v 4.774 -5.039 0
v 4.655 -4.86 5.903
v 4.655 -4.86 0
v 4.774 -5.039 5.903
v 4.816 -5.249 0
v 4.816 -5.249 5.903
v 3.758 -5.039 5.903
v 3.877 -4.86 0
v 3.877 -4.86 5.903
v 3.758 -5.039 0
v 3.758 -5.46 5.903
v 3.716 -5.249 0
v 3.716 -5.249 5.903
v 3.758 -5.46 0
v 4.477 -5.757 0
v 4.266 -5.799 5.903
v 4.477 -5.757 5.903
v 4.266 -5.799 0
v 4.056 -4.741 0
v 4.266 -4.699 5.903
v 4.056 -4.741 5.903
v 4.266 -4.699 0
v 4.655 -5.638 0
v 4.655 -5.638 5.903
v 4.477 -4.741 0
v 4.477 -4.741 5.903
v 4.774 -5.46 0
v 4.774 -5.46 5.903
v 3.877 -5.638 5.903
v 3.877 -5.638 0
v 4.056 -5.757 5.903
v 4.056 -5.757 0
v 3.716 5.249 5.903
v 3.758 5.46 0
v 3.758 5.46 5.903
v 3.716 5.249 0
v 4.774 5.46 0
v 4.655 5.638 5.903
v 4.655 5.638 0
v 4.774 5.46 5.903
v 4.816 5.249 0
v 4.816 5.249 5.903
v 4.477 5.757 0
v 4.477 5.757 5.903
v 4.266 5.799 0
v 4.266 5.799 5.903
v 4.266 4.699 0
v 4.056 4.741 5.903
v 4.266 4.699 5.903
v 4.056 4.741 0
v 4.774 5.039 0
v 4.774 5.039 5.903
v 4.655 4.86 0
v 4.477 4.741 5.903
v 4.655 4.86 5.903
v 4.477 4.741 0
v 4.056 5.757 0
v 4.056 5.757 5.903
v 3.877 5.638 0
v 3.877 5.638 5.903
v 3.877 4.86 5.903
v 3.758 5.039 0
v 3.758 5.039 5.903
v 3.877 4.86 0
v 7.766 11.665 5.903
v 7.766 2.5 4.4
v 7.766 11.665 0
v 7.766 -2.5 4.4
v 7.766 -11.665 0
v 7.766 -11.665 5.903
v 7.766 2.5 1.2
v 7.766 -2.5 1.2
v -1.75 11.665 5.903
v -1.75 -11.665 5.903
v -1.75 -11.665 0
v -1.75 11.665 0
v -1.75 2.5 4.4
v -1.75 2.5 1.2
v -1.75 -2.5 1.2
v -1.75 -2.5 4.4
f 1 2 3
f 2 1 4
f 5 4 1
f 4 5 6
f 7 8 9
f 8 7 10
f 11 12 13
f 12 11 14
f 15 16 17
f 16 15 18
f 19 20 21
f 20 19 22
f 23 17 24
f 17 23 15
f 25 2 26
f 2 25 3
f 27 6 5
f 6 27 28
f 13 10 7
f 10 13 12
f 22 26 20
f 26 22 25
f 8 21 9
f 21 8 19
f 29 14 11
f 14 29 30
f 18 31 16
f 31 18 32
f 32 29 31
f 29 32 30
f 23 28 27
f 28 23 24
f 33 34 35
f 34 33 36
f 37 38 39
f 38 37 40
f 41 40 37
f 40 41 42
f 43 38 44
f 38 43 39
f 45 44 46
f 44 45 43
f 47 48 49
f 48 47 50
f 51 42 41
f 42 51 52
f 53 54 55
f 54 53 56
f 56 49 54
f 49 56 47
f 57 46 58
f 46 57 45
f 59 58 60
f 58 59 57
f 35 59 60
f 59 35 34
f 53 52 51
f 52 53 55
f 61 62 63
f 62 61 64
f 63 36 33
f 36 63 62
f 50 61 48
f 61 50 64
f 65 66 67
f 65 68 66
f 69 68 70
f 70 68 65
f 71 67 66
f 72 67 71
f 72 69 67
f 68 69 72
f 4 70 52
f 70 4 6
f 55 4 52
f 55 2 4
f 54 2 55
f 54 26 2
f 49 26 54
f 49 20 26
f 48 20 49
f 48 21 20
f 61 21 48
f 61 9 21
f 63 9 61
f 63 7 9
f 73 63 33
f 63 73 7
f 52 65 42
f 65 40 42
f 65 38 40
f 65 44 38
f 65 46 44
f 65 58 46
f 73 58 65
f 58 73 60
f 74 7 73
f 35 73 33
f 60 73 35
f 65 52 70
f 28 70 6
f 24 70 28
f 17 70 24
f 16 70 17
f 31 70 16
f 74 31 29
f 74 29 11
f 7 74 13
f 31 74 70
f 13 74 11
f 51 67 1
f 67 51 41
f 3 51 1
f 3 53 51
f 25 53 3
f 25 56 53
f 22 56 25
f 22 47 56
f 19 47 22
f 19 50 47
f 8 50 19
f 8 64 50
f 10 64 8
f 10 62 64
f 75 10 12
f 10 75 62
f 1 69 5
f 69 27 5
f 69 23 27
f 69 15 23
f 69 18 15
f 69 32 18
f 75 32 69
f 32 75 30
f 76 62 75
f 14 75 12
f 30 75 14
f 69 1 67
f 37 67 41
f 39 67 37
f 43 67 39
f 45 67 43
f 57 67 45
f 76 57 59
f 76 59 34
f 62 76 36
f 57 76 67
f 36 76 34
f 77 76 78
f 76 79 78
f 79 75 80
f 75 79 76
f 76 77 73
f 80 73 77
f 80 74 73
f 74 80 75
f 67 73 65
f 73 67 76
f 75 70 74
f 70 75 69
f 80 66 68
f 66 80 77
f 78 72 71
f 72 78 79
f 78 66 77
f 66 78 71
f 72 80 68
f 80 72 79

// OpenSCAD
// file: ../../library/e7_all.scad
// ==========================================================================
//  e7_all.scad - include this one file. Preview, print plates and the report.
// ==========================================================================
include <e7_params.scad>
include <e7_body.scad>

// whole painted loco
module e7_preview() {
  // carbody in its paint bands
  for (i = [0:len(PAINT_BANDS) - 1]) {
    z0 = i == 0 ? -1 : p(PAINT_BANDS[i - 1][0]);
    z1 = i == len(PAINT_BANDS) - 1 ? 1000 : p(PAINT_BANDS[i][0]);
    color(PAINT_BANDS[i][1]) render(convexity = 8) e7_shell_solid([z0, z1]);
  }
  color(C_GLASS) e7_glass();
  color(C_LENS) let (d = nose_d_at_z(HEADLIGHT[0]))
    translate([XF - p(d) + p(HEADLIGHT[2]) + p(1.5), 0, p(HEADLIGHT[0])]) rotate([0, 90, 0]) cylinder(d = p(HEADLIGHT[1]) - 0.8, h = 0.5, $fn = 32);
  color(C_FRAME) { for (j = [1:NFRAME]) e7_frame_piece(j); e7_pilot(); e7_pilot_rear(); }
  for (tx = [TRK_X, -TRK_X]) translate([tx, 0, 0]) { color(C_TRUCK) e7_truck_frame(); color(C_WHEEL) e7_wheels(); }
}
// thin glass panes sitting in the window pockets (preview only)
module e7_glass() {
  intersection() { e7_loft(DET * 0.6); union() { e7_windshield_cut(); e7_side_cuts_windows_only(); } }
}
module e7_side_cuts_windows_only() {
  for (s = [-1, 1], w = CAB_WIN)
    translate([XF - p(w[1]), s * HW - (s > 0 ? DET : 3 - DET), p(w[2])]) cube([p(w[1] - w[0]), 3, p(w[3] - w[2])]);
}

// one print, laid out for the printer
module e7_plate(part) {
  sec = [for (k = [1:NSEC]) str("body_", k)];
  frm = [for (j = [1:NFRAME]) str("frame_", j)];
  if (is_num(search([part], sec)[0])) {
    k = search([part], sec)[0] + 1;
    // stand the section on its open bottom (skirt edge on the bed)
    translate([-sec_x0(k) - SEC_L / 2, 0, -Z_SKIRT]) e7_body_section(k);
  } else if (is_num(search([part], frm)[0])) {
    j = search([part], frm)[0] + 1;
    xs = concat([FRAME_X0], FRAME_SPLITS, [FRAME_X1]);
    translate([-(xs[j - 1] + xs[j]) / 2, 0, -Z_FRAME_BOT]) e7_frame_piece(j);
  } else if (part == "pilot") {
    translate([-XF, 0, 0]) rotate([0, 0, 0]) translate([0, 0, -p(5)]) e7_pilot();
  } else if (part == "pilot_rear") {
    translate([-XR, 0, 0]) translate([0, 0, -(CPL_Z - CPL_H / 2 - WALL)]) e7_pilot_rear();
  } else if (part == "truck") {
    // upside down, bolster on the bed
    translate([0, 0, Z_FRAME_BOT - 0.3]) rotate([180, 0, 0]) e7_truck_frame();
  } else {
    assert(false, str("unknown part '", part, "'"));
  }
}

module e7_report() {
  echo(str("MILW E7A ", ROAD_NO, " class ", CLASS, " - ", SC, " scale 1:", RATIO, ", paint ", PAINT));
  echo(str("  carbody ", round(BL), " mm long, ", round(2 * HW), " mm wide, roof ", round(Z_ROOF), " mm, cab ", round(Z_CAB), " mm above rail"));
  echo(str("  ", NSEC, " body sections of ", round(SEC_L), " mm; ", NFRAME, " frame pieces; trucks at +/- ", round(TRK_X), " mm"));
  echo(str("  body screws ", SCREW_BODY_NAME, " x ", 2 * len(BOSS_X), "; truck pivots ", PIVOT[1], "; wheels ", round(WHEEL_D * 10) / 10, " mm (bought)"));
}
// main file
// Milwaukee Road E7A, HO scale 1-87 - print 5 of 6: pilot_rear - rear coupler pocket block
// Render (F6), export STL, print. Settings: ../../library/e7_params.scad
// Whole loco preview and notes: ../../MILW_E7_Main.scad
SCALE_SEL = "HO";
include <../../library/e7_all.scad>
e7_plate("pilot_rear");
